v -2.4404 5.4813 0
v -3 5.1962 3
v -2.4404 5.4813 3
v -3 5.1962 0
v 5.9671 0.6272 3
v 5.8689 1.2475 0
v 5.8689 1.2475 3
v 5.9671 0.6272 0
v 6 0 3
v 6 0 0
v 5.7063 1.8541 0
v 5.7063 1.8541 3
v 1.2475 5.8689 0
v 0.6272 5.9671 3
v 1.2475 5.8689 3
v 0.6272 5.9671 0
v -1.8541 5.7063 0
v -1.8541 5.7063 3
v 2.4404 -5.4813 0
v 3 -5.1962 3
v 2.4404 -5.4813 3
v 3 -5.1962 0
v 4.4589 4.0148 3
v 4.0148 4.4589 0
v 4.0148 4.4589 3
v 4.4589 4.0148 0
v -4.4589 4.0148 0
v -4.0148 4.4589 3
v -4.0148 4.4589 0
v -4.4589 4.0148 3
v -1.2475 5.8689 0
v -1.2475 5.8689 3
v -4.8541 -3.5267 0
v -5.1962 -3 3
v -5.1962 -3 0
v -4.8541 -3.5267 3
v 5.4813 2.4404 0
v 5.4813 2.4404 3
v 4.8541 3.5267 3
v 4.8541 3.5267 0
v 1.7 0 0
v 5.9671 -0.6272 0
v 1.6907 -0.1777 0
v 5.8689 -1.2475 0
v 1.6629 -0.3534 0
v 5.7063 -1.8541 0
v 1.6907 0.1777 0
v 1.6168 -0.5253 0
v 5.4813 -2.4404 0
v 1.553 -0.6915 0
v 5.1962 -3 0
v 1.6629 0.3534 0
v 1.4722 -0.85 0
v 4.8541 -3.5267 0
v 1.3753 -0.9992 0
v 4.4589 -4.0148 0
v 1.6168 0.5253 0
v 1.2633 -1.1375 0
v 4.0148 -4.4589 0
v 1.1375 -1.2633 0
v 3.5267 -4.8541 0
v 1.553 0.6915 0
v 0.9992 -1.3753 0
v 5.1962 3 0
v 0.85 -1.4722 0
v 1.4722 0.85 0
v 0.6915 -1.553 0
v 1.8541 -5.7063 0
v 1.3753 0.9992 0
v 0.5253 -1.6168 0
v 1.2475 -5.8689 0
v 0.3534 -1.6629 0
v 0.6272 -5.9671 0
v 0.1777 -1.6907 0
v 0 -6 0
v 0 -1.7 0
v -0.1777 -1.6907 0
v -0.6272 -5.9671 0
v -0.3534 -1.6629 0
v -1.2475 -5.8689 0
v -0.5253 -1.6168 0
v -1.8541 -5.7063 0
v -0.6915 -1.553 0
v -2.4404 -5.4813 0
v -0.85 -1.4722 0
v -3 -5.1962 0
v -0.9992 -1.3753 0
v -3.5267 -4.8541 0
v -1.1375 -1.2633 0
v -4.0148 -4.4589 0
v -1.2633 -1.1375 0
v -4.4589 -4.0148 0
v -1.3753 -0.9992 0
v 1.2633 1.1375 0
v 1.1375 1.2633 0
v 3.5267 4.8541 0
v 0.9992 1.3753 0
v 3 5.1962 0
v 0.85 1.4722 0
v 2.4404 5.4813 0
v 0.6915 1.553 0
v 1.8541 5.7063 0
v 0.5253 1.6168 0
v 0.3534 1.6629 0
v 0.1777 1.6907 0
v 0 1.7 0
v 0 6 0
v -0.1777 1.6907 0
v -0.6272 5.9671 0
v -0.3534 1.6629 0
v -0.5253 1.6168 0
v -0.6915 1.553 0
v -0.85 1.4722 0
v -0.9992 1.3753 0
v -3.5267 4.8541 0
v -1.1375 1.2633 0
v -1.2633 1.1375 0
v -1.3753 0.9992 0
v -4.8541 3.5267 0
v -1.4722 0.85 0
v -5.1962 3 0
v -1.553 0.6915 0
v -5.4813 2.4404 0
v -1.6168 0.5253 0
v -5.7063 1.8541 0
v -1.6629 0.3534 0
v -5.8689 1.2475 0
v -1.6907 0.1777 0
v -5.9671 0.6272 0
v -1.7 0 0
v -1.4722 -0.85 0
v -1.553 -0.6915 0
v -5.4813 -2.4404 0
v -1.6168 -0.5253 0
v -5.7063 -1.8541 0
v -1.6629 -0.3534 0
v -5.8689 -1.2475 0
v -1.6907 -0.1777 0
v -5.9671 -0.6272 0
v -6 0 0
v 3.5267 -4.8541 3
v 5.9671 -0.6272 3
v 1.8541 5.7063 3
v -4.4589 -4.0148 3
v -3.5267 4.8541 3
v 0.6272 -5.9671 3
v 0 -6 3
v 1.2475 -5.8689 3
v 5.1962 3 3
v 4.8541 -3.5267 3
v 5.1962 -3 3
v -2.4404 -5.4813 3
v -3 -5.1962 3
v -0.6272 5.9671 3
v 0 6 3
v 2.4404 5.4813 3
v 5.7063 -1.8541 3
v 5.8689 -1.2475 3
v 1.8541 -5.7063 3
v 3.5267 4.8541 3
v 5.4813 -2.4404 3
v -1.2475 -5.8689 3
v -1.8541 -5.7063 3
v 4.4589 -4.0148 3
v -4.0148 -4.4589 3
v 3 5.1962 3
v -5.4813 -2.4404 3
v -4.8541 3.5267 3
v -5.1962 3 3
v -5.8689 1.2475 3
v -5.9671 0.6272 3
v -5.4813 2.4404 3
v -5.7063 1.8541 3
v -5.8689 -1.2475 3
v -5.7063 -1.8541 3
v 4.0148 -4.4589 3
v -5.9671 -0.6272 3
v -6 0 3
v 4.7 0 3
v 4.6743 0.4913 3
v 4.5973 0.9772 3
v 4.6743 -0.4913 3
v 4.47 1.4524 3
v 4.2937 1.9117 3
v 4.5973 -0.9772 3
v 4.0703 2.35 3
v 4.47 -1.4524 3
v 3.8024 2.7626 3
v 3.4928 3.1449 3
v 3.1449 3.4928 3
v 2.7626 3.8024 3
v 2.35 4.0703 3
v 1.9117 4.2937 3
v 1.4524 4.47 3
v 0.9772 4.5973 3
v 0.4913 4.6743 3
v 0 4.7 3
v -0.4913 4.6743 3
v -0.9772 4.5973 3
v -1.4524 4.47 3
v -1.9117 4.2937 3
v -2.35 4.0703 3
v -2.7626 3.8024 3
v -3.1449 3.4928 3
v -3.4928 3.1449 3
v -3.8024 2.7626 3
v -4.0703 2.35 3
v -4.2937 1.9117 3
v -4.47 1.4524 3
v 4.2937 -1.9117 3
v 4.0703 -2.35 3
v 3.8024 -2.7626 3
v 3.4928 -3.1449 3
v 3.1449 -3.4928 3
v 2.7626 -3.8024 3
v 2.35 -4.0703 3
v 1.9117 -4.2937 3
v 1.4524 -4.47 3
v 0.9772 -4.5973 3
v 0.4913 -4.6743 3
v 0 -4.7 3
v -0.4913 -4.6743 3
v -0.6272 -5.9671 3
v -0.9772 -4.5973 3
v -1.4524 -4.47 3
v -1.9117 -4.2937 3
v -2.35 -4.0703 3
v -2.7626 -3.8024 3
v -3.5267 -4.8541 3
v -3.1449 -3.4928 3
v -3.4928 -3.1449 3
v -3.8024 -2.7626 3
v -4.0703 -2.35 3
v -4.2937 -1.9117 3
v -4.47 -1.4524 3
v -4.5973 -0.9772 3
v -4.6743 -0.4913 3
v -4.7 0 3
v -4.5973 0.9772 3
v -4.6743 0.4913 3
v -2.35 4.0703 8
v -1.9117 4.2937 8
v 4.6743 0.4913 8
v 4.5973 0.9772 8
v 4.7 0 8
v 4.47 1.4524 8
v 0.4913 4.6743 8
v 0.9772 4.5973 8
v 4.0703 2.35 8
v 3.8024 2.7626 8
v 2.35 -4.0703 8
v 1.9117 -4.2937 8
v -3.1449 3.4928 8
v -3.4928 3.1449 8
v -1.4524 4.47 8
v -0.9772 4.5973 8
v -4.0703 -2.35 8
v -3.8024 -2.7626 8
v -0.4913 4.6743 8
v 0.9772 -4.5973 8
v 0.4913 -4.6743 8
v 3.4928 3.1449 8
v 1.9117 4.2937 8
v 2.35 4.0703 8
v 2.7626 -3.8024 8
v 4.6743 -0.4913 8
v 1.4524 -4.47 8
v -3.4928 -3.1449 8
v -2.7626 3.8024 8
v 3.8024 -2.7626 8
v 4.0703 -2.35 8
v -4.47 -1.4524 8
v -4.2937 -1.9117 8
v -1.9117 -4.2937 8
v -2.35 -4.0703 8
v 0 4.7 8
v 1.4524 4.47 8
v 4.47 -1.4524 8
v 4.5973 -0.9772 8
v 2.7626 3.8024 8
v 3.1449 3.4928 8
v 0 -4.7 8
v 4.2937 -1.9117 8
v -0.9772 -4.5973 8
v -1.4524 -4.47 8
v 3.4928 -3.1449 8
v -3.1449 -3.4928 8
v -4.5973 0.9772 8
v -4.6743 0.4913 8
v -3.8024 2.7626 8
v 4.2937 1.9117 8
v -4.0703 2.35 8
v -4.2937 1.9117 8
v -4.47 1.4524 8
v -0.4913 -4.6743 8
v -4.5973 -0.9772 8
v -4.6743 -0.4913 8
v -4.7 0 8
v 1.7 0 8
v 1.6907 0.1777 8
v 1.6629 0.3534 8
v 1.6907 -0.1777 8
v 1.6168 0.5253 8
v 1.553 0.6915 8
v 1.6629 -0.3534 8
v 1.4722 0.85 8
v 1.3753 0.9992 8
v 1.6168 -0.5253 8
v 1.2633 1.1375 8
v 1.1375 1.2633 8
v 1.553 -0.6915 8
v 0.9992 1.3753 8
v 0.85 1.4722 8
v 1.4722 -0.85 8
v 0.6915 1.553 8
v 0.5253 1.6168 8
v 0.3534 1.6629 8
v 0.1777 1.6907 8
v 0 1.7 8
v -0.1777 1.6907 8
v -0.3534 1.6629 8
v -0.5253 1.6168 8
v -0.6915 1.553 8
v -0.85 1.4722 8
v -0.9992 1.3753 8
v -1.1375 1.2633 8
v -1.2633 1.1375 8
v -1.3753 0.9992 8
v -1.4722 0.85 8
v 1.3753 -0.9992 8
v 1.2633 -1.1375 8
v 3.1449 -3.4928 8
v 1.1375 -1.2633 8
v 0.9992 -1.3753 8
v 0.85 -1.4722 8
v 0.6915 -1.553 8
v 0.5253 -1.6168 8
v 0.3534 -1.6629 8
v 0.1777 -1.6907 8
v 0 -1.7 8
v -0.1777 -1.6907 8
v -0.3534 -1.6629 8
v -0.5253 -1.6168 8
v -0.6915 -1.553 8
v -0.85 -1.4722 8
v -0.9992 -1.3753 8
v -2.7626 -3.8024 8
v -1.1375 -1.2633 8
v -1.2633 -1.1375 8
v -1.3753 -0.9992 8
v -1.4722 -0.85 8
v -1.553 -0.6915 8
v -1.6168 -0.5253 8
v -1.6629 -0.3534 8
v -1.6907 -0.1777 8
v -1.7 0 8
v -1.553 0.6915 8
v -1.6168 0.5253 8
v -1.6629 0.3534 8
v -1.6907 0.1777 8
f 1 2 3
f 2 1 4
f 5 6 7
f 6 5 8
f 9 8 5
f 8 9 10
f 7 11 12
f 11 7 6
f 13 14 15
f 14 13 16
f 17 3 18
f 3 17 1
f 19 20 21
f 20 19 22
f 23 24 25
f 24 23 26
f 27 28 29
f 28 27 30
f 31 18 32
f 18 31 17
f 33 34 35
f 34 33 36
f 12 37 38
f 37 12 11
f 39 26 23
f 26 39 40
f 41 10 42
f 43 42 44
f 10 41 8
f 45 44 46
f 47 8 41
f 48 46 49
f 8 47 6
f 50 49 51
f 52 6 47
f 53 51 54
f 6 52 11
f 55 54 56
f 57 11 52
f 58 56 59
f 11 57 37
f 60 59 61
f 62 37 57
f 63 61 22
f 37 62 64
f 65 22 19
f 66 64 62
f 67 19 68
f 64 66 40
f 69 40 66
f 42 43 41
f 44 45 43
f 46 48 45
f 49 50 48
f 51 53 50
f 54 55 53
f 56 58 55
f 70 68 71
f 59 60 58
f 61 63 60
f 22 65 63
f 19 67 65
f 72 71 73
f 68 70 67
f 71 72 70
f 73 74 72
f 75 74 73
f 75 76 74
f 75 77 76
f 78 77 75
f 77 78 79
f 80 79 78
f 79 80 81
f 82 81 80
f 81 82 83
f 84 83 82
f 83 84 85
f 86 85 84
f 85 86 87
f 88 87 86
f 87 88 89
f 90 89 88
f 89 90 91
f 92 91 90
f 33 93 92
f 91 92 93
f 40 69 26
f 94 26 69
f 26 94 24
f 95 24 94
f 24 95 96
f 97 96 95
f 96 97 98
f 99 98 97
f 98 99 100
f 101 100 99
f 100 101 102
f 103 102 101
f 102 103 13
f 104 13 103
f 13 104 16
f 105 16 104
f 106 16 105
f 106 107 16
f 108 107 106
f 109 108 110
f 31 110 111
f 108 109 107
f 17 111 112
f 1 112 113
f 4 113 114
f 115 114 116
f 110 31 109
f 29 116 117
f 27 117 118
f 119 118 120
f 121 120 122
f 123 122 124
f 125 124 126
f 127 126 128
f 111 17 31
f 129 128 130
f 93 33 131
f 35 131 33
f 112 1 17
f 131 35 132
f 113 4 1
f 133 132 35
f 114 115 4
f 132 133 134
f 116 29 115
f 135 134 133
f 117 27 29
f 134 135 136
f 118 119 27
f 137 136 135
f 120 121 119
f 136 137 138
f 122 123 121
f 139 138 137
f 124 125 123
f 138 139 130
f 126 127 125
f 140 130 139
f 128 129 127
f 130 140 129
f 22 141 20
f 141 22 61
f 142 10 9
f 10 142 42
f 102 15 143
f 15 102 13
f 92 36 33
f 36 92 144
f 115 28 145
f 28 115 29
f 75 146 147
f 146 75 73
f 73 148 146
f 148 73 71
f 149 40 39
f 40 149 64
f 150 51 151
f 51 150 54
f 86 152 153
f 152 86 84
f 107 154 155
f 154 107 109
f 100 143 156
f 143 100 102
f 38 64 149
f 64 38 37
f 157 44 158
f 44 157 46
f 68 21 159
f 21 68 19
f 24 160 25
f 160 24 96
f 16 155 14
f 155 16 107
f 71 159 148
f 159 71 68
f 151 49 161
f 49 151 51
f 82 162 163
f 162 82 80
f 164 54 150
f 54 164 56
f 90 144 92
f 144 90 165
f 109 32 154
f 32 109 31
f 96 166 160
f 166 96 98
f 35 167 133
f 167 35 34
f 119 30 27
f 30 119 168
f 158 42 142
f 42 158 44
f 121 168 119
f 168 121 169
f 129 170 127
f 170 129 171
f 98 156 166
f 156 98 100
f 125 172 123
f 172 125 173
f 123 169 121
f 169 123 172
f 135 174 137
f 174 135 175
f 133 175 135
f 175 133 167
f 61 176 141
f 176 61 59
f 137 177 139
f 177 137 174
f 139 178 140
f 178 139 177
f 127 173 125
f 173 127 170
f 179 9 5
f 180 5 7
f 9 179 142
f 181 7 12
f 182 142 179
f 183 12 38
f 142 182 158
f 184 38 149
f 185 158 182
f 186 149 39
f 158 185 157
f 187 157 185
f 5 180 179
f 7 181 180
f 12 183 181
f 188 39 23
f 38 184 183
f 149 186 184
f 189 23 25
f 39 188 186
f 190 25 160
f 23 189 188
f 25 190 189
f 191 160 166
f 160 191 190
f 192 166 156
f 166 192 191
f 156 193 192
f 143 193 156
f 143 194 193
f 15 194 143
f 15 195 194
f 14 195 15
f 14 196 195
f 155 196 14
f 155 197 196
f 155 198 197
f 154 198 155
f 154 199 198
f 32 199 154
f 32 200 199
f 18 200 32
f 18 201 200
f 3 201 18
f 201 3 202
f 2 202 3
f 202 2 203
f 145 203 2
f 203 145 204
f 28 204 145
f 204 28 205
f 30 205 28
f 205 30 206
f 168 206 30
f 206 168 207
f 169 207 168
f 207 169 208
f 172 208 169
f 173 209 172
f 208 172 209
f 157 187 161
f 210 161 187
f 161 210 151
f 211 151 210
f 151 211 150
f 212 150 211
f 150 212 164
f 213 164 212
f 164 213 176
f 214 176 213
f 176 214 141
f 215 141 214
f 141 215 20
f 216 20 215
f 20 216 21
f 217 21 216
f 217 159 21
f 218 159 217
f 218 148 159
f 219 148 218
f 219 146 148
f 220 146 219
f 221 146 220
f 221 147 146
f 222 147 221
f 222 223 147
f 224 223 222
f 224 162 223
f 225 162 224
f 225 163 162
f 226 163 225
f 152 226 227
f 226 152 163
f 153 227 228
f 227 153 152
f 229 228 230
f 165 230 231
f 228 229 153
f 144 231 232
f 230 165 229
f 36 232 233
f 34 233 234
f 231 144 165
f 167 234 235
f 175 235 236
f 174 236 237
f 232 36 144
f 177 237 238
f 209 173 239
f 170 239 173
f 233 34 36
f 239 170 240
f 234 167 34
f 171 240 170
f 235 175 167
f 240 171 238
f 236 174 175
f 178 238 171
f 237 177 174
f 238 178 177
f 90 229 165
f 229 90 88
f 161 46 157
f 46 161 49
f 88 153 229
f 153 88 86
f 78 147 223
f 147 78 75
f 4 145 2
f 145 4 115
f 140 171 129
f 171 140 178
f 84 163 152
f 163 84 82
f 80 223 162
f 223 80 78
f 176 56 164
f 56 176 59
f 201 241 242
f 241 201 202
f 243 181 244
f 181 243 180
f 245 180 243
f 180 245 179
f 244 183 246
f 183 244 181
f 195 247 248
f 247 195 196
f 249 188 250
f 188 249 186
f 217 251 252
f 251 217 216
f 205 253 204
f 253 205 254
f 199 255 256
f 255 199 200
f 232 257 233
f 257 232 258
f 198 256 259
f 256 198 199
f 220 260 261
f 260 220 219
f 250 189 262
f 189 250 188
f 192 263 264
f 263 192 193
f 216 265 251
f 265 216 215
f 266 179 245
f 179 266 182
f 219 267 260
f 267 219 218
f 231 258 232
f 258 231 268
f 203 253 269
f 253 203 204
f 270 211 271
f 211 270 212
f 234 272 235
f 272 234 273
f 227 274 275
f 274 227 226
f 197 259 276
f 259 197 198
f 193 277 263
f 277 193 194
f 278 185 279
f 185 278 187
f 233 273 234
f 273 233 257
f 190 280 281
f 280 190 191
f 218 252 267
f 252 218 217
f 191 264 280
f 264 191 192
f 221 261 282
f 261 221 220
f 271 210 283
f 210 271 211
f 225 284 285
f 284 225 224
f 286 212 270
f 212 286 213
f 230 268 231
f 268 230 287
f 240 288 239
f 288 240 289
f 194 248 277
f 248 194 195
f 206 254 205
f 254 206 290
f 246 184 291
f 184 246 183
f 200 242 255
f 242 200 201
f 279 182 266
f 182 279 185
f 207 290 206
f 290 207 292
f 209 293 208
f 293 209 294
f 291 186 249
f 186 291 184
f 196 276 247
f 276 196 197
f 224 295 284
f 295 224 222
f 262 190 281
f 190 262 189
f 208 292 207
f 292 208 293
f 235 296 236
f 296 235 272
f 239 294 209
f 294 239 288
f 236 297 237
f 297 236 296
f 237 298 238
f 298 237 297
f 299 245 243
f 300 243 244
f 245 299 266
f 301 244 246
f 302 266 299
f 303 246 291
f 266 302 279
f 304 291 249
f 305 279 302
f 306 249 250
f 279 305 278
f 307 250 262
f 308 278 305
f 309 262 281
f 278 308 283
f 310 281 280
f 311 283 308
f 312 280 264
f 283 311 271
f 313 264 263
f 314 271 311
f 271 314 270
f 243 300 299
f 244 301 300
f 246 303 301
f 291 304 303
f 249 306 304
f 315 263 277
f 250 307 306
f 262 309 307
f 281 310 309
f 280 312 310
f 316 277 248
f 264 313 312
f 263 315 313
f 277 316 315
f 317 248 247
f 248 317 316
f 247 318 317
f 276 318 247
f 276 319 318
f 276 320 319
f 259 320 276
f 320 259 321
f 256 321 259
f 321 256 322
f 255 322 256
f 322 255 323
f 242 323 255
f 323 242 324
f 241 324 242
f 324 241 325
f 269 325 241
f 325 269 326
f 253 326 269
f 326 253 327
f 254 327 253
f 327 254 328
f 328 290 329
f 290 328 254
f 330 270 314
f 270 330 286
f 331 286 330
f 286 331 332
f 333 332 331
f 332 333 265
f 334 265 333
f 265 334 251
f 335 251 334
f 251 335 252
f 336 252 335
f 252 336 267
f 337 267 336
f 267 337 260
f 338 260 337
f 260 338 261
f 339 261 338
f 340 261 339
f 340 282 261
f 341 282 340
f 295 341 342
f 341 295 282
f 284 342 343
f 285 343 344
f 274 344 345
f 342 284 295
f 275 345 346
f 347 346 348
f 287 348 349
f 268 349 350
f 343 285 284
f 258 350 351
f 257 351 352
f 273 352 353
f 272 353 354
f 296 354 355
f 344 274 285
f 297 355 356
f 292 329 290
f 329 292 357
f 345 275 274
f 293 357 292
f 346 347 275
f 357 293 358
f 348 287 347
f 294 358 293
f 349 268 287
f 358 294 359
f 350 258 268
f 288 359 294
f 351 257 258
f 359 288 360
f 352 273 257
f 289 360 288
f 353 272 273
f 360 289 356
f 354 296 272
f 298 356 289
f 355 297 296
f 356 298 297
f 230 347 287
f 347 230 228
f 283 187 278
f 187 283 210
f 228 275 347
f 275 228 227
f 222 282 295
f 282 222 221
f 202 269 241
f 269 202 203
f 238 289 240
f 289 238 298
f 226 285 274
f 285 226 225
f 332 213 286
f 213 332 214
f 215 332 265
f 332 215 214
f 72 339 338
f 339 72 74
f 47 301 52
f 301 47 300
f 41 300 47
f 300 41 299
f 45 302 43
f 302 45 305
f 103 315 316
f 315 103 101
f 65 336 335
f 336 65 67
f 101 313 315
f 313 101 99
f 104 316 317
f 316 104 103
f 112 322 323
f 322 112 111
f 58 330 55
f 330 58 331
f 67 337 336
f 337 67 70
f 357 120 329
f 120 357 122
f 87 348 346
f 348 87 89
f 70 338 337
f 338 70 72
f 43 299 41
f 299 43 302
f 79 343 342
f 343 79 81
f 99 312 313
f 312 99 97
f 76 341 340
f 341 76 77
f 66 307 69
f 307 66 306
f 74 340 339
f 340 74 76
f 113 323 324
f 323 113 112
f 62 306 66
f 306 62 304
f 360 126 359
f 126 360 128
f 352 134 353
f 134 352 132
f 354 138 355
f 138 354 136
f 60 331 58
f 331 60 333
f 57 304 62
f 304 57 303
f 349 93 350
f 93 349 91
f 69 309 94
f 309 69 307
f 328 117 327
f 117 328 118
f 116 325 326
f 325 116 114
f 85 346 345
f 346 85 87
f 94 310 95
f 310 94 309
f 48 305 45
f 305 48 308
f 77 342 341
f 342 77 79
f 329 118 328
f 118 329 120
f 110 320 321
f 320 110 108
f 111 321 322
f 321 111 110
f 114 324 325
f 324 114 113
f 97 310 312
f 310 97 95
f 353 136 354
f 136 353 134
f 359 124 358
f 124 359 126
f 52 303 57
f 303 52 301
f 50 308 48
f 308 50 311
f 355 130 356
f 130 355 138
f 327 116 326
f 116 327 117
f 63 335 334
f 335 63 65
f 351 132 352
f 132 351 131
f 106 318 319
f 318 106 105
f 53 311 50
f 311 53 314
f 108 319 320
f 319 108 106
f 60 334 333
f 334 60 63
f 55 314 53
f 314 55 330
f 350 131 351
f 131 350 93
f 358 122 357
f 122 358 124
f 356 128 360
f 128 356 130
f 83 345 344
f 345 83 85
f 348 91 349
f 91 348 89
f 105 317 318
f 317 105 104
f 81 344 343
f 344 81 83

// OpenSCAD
// Threaded mounting boss.
$fn = 60;
eps = 0.02;
thread_d = 3.4;
base_d = 12;
height = 8;
difference() { union() { cylinder(d=base_d,h=3); cylinder(d=thread_d+6,h=height); } translate([0,0,-eps]) cylinder(d=thread_d,h=height+2*eps); }
